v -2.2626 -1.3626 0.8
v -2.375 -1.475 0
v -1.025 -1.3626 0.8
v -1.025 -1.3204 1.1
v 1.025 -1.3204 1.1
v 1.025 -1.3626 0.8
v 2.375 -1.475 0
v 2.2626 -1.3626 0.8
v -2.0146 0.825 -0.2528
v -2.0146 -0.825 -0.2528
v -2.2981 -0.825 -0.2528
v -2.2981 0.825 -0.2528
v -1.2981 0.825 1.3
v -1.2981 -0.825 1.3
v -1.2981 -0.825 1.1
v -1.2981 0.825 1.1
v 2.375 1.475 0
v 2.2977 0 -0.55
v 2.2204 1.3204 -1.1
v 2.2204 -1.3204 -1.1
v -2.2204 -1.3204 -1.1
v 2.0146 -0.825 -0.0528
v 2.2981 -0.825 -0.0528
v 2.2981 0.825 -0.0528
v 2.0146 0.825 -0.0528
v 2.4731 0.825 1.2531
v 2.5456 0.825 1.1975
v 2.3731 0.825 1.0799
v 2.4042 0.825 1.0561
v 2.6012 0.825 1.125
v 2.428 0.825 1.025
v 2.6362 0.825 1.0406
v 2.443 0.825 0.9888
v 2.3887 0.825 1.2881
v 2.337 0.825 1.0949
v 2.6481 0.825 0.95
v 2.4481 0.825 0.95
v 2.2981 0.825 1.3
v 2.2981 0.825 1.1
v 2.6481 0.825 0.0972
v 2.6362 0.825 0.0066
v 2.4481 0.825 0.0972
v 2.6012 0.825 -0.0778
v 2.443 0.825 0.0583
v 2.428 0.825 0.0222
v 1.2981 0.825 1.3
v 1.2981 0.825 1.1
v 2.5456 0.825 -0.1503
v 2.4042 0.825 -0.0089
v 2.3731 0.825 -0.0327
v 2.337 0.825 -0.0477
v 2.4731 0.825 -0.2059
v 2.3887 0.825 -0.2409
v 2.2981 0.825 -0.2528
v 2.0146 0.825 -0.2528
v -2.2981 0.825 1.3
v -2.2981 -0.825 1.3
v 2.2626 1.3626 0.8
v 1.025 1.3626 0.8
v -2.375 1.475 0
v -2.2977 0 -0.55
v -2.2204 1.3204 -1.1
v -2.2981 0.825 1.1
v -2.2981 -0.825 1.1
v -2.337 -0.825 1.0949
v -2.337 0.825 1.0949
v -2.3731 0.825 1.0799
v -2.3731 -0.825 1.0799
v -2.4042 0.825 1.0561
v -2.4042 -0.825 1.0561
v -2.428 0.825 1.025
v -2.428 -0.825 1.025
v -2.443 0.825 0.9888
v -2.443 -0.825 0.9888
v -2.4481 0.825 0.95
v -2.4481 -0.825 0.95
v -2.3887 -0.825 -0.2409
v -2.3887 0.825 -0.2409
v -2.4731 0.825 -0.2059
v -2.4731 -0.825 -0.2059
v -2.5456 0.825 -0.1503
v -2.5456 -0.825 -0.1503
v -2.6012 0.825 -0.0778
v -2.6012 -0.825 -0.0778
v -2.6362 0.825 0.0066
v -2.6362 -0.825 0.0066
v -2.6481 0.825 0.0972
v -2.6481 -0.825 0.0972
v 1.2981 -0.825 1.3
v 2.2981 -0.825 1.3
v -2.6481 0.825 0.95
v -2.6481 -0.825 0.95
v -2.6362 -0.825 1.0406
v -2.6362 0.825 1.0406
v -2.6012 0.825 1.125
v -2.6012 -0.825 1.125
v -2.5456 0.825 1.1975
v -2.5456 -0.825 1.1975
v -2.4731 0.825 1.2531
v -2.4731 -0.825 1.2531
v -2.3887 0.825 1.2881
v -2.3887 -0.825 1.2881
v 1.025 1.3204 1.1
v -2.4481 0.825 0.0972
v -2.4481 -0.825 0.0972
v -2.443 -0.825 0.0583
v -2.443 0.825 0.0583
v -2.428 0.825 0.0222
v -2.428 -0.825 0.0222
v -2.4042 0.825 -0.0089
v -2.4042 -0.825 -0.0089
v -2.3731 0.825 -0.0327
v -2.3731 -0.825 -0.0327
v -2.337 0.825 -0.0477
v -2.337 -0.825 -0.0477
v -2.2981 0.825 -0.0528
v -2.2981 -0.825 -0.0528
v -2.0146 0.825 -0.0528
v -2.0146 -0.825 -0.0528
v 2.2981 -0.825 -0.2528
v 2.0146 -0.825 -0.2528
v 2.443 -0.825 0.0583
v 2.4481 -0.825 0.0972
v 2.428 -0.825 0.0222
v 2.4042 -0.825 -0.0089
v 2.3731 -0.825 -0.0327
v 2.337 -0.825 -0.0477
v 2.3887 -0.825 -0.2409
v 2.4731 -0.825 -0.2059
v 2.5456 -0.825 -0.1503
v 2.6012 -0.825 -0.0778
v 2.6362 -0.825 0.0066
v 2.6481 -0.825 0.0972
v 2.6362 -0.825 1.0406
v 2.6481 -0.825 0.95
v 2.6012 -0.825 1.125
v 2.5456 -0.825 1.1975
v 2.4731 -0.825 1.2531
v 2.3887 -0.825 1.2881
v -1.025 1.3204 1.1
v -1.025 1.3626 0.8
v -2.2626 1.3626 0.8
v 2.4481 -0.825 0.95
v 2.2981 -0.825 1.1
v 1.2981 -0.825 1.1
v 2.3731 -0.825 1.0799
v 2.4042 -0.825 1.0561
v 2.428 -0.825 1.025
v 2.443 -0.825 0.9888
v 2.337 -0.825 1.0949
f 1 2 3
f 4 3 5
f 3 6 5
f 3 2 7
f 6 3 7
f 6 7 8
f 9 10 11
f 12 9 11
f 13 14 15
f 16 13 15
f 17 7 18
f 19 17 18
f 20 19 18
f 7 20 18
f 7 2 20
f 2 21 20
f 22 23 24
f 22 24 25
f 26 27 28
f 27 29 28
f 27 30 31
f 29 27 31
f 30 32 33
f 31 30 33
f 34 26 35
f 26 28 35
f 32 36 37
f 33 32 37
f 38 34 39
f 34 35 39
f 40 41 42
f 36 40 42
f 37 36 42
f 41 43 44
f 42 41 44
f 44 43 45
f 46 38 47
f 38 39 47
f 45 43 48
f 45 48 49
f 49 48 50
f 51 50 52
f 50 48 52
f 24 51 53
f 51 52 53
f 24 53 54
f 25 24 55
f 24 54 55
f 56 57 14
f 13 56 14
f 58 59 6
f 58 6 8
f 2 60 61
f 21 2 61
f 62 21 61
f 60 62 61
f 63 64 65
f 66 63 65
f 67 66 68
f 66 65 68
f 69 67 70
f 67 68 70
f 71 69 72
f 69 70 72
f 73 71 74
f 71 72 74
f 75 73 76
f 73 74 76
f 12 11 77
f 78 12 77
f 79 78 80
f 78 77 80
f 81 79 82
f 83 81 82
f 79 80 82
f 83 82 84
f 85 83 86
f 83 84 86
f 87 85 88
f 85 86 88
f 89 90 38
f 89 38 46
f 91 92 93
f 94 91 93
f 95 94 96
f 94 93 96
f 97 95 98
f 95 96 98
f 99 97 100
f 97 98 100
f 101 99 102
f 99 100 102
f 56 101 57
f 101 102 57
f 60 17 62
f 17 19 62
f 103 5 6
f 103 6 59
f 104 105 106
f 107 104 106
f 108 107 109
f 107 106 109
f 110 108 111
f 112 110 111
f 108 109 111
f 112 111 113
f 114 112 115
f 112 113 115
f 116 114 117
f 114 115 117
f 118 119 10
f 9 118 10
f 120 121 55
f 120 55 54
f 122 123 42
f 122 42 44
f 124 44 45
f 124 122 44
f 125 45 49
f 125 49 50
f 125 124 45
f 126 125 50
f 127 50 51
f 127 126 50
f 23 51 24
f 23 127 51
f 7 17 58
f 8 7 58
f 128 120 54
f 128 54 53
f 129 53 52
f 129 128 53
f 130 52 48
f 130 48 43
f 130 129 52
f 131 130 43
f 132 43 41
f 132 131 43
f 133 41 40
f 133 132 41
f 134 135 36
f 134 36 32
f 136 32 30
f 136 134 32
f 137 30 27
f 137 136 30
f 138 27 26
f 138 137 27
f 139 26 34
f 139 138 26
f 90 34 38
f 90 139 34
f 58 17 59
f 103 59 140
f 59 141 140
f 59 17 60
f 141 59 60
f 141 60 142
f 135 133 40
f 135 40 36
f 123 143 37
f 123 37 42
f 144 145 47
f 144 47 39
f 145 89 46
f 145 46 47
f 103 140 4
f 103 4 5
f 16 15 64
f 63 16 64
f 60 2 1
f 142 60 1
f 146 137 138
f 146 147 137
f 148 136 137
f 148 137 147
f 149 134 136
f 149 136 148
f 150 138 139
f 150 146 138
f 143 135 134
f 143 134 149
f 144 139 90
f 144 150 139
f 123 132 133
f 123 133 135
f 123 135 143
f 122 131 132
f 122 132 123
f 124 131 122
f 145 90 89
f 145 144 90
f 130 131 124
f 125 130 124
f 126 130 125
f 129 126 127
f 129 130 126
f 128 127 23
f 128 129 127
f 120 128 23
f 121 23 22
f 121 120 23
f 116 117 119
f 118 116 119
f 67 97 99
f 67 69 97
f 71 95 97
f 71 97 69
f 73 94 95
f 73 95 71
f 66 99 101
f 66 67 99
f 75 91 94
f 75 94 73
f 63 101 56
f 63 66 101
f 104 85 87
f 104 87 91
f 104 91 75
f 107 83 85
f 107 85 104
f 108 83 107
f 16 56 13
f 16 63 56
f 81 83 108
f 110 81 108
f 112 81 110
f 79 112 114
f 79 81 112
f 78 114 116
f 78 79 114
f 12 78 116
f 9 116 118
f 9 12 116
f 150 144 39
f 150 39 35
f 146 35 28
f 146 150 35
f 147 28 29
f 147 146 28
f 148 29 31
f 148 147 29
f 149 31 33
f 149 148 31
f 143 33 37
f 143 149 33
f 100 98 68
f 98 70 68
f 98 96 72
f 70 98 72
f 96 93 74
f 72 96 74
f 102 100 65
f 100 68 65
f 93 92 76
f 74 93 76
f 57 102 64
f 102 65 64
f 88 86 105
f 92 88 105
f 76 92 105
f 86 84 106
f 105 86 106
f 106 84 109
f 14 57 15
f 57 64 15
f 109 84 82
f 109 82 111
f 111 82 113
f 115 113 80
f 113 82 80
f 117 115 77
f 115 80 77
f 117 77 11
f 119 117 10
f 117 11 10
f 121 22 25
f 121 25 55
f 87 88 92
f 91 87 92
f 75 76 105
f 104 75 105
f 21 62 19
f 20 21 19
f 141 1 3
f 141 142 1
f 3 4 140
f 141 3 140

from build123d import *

# Parameters (mm, degrees)
SKETCH1_W                     = 4.75
SKETCH1_H                     = 2.95
BOSS_EXTRUDE1_DEPTH           = 1.1
BOSS_EXTRUDE1_TAPER           = 8
BOSS_EXTRUDE1_OTHER_WAY_DEPTH = 1.1
BOSS_EXTRUDE1_OTHER_WAY_TAPER = 8
SKETCH3_W                     = 1.787084683
SKETCH3_H                     = 3.398135214
SKETCH3_W_2                   = 1.719767091
CUT_EXTRUDE2_DEPTH            = 0.3
BASE_FLANGE1_DEPTH            = 0.825
BASE_FLANGE1_DEPTH_BACK       = 0.825


# Sheet-metal steps are written as plain solids
with BuildPart() as part:
    # Sketch1 → Boss-Extrude1 (new body)
    with BuildSketch(Plane.XY):
        Rectangle(SKETCH1_W, SKETCH1_H)
    extrude(amount=BOSS_EXTRUDE1_DEPTH, taper=BOSS_EXTRUDE1_TAPER)

    # Sketch1 → Boss-Extrude1 other way (add)
    with BuildSketch(Plane.XY):
        Rectangle(SKETCH1_W, SKETCH1_H)
    extrude(amount=-BOSS_EXTRUDE1_OTHER_WAY_DEPTH, taper=BOSS_EXTRUDE1_OTHER_WAY_TAPER)

    # Sketch3 → Cut-Extrude2 (cut)
    with BuildSketch(Plane.XY.offset(1.1)):
        with Locations((1.918542342, 0.018295727)):
            Rectangle(SKETCH3_W, SKETCH3_H)
        with Locations((-1.884883546, 0.018295727)):
            Rectangle(SKETCH3_W_2, SKETCH3_H)
    extrude(amount=-CUT_EXTRUDE2_DEPTH, mode=Mode.SUBTRACT)


with BuildPart() as body_2:
    # Sketch4 → Base-Flange1 (new, two sides: drawn at the far end of the back side and taken through both)
    with BuildSketch(Plane(origin=(0, 0, 0), x_dir=(1, 0, 0), z_dir=(0, 1, 0)).offset(-BASE_FLANGE1_DEPTH_BACK)):
        with BuildLine():
            Line((2.014642842, 0.252838218), (2.298133825, 0.252838218))
            ThreePointArc((2.298133825, 0.252838218), (2.545621198, 0.150325591), (2.648133825, -0.097161782))
            Line((2.648133825, -0.097161782), (2.648133825, -0.95))
            ThreePointArc((2.648133825, -0.95), (2.545621198, -1.197487373), (2.298133825, -1.3))
            Line((2.298133825, -1.3), (1.298133825, -1.3))
            Line((1.298133825, -1.3), (1.298133825, -1.1))
            Line((1.298133825, -1.1), (2.298133825, -1.1))
            ThreePointArc((2.298133825, -1.1), (2.404199842, -1.056066017), (2.448133825, -0.95))
            Line((2.448133825, -0.95), (2.448133825, -0.097161782))
            ThreePointArc((2.448133825, -0.097161782), (2.404199842, 0.008904235), (2.298133825, 0.052838218))
            Line((2.298133825, 0.052838218), (2.014642842, 0.052838218))
            Line((2.014642842, 0.052838218), (2.014642842, 0.252838218))
        make_face()
    extrude(amount=BASE_FLANGE1_DEPTH + BASE_FLANGE1_DEPTH_BACK)


with BuildPart() as body_3:
    # Mirror1: mirrored copy
    add(body_2.part.mirror(Plane.ZY))


solid = Compound([part.part, body_2.part, body_3.part])
